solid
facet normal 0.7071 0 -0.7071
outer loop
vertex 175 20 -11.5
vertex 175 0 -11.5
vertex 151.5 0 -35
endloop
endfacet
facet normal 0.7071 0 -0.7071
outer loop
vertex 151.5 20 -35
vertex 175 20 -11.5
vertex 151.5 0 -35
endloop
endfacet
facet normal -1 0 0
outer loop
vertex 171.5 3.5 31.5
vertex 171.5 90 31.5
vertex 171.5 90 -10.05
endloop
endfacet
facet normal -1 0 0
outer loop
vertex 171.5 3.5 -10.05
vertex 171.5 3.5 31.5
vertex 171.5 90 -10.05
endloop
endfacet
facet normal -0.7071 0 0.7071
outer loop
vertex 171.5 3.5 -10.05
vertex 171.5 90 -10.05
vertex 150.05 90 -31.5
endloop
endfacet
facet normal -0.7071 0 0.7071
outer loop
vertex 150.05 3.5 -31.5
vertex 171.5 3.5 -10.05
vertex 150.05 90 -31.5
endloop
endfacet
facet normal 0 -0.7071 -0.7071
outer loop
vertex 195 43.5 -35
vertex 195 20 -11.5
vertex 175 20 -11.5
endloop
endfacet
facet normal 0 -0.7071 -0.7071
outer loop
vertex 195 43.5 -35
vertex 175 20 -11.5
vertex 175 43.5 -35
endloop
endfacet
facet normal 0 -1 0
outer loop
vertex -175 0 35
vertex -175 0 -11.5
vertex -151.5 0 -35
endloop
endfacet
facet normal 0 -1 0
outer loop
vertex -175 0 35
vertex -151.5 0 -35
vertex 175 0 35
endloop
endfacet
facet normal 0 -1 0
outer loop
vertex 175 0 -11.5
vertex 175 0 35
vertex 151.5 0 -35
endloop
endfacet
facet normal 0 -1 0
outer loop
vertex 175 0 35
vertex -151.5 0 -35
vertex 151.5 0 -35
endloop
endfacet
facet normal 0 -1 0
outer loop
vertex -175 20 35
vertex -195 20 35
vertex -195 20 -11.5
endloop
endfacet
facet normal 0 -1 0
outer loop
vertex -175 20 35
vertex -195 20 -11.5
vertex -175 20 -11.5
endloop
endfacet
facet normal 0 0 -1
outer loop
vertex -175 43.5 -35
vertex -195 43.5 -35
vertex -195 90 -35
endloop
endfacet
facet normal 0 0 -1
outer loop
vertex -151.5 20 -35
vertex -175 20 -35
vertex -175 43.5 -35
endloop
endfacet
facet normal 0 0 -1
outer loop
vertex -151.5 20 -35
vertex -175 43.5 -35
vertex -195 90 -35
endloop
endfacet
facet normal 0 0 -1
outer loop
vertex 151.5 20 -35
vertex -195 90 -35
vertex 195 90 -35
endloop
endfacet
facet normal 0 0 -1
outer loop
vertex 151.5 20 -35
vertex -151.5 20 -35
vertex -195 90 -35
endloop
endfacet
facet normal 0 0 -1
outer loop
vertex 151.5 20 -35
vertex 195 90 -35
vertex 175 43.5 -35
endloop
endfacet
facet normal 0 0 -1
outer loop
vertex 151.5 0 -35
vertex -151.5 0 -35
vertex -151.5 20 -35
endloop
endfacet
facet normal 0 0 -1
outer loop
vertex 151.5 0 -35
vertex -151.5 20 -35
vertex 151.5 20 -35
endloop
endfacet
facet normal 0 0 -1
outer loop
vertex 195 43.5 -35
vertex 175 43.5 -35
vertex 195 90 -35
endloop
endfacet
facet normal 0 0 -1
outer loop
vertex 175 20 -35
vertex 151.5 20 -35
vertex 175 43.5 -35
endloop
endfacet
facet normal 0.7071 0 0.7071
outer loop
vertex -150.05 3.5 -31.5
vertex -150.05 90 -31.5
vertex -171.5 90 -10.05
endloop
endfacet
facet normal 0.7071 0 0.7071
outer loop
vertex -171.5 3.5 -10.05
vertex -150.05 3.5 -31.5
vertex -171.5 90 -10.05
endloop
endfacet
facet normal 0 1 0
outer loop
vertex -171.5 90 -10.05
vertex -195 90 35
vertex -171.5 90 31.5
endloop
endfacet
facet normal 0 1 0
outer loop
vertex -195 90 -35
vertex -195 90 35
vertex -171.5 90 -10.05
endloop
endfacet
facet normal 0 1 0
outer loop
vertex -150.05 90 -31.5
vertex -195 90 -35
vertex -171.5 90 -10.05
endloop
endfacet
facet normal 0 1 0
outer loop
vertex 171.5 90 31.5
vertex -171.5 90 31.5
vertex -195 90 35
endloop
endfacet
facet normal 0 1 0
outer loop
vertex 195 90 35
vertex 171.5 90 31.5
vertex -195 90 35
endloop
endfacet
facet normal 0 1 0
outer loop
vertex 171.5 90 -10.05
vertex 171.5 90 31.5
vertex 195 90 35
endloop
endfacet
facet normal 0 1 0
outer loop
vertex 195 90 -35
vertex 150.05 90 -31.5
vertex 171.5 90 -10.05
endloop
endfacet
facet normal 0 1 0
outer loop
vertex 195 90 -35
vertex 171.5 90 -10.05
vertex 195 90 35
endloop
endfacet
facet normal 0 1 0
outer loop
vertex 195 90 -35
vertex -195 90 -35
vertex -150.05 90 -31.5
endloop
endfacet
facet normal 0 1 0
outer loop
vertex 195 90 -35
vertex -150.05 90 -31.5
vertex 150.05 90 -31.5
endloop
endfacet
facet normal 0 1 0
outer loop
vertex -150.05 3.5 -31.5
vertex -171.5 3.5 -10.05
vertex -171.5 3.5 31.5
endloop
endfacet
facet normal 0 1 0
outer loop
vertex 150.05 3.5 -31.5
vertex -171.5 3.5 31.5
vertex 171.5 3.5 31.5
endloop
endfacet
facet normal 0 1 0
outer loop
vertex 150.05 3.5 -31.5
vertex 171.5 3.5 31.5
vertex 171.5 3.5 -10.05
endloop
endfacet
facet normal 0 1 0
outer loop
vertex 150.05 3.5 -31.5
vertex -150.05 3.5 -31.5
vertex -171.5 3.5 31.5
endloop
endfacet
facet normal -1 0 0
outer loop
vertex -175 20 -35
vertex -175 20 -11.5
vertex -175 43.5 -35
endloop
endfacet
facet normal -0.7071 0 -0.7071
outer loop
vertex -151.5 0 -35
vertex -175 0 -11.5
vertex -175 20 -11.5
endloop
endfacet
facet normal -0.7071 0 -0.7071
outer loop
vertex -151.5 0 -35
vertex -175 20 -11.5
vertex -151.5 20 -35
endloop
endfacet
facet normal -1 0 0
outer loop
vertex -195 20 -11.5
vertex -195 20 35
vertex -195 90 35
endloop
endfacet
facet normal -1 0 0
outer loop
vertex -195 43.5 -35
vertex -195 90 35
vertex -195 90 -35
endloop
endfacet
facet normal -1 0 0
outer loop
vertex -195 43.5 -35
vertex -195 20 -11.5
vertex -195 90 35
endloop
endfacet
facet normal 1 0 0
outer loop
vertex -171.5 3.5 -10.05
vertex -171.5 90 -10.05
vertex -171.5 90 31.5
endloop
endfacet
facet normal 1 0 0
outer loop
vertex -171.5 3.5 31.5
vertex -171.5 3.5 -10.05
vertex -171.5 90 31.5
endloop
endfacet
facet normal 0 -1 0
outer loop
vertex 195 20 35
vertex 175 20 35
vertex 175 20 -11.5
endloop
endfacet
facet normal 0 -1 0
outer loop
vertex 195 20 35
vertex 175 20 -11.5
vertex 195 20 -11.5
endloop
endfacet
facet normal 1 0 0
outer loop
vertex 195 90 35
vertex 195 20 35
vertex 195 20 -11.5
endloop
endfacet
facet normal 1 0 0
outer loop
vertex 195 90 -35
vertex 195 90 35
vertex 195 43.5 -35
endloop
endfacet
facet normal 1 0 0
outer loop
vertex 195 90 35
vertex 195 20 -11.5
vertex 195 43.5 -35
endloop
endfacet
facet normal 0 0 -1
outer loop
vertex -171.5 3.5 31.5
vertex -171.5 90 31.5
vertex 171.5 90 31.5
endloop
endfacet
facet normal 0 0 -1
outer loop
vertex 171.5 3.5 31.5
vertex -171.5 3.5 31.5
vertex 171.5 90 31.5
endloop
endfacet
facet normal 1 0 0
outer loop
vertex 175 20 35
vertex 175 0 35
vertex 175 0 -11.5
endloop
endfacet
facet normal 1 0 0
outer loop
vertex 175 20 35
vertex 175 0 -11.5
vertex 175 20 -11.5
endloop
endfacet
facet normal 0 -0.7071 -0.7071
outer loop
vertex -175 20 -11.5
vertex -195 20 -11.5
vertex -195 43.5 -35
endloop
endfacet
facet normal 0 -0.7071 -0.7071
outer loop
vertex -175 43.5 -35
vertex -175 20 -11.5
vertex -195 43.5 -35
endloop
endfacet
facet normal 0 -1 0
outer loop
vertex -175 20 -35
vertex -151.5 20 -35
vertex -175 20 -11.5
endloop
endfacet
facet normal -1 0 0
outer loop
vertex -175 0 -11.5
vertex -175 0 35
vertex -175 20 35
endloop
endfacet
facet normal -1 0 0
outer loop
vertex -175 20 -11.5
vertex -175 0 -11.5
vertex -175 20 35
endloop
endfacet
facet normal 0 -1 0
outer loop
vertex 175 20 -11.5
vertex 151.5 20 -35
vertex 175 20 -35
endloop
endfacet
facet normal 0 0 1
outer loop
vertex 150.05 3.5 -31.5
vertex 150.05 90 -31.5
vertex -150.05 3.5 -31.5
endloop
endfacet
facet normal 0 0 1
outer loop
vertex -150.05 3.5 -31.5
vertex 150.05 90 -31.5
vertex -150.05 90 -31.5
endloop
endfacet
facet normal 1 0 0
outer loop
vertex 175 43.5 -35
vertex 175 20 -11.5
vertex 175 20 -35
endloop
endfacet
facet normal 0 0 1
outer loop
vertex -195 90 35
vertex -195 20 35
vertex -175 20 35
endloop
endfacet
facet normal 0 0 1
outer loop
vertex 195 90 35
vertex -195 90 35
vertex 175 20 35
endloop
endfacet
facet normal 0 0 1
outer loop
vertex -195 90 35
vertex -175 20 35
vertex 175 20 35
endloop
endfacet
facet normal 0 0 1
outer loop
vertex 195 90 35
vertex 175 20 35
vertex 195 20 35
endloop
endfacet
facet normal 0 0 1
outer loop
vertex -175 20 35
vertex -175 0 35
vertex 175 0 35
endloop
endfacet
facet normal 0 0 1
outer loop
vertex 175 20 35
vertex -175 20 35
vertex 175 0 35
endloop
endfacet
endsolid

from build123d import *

# Parameters (mm, degrees)
SKETCH_1_W          = 390
SKETCH_1_H          = 70
EXTRUDE_1_DEPTH     = 90
SKETCH_2_W          = 20
SKETCH_2_H          = 20
CUT_EXTRUDE_1_DEPTH = 85
CUT_EXTRUDE_2_DEPTH = 20
CUT_EXTRUDE_3_DEPTH = 20
CUT_EXTRUDE_4_DEPTH = 86.5


with BuildPart() as part:
    # 草圖1 → 填料-伸長1 (new body)
    with BuildSketch(Plane(origin=(0, 0, 0), x_dir=(1, 0, 0), z_dir=(0, 1, 0))):
        Rectangle(SKETCH_1_W, SKETCH_1_H)
    extrude(amount=EXTRUDE_1_DEPTH)

    # 草圖2 → 除料-伸長1 (cut)
    with BuildSketch(Plane.XY.offset(35)):
        with Locations((185, 10)):
            Rectangle(SKETCH_2_W, SKETCH_2_H)
        with Locations((-185, 10)):
            Rectangle(SKETCH_2_W, SKETCH_2_H)
    extrude(amount=-CUT_EXTRUDE_1_DEPTH, mode=Mode.SUBTRACT)

    # 草圖3 → 除料-伸長2 (cut)
    with BuildSketch(Plane(origin=(195, 0, 0), x_dir=(0, 0, -1), z_dir=(1, 0, 0))):
        Polygon((35, 20), (11.5, 20), (35, 43.5), align=None)
    cut_extrude_2 = extrude(amount=-CUT_EXTRUDE_2_DEPTH, mode=Mode.SUBTRACT)

    # 鏡射1: 除料-伸長2 across plane
    add(cut_extrude_2.mirror(Plane(origin=(0, 0, 0), x_dir=(0, 0, 1), z_dir=(1, 0, 0))), mode=Mode.SUBTRACT)

    # 草圖4 → 除料-伸長3 (cut)
    with BuildSketch(Plane.XZ):
        Polygon((-151.5, -35), (-175, -35), (-175, -11.5), align=None)
        Polygon((175, -11.5), (151.5, -35), (175, -35), align=None)
    extrude(amount=-CUT_EXTRUDE_3_DEPTH, mode=Mode.SUBTRACT)

    # 草圖5 → 除料-伸長4 (cut)
    with BuildSketch(Plane(origin=(0, 90, 0), x_dir=(1, 0, 0), z_dir=(0, 1, 0))):
        Polygon((-171.5, 10.050252532), (-171.5, -31.5), (171.5, -31.5), (171.5, 10.050252532), (150.050252532, 31.5), (-150.050252532, 31.5), align=None)
    extrude(amount=-CUT_EXTRUDE_4_DEPTH, mode=Mode.SUBTRACT)


solid = part.part
